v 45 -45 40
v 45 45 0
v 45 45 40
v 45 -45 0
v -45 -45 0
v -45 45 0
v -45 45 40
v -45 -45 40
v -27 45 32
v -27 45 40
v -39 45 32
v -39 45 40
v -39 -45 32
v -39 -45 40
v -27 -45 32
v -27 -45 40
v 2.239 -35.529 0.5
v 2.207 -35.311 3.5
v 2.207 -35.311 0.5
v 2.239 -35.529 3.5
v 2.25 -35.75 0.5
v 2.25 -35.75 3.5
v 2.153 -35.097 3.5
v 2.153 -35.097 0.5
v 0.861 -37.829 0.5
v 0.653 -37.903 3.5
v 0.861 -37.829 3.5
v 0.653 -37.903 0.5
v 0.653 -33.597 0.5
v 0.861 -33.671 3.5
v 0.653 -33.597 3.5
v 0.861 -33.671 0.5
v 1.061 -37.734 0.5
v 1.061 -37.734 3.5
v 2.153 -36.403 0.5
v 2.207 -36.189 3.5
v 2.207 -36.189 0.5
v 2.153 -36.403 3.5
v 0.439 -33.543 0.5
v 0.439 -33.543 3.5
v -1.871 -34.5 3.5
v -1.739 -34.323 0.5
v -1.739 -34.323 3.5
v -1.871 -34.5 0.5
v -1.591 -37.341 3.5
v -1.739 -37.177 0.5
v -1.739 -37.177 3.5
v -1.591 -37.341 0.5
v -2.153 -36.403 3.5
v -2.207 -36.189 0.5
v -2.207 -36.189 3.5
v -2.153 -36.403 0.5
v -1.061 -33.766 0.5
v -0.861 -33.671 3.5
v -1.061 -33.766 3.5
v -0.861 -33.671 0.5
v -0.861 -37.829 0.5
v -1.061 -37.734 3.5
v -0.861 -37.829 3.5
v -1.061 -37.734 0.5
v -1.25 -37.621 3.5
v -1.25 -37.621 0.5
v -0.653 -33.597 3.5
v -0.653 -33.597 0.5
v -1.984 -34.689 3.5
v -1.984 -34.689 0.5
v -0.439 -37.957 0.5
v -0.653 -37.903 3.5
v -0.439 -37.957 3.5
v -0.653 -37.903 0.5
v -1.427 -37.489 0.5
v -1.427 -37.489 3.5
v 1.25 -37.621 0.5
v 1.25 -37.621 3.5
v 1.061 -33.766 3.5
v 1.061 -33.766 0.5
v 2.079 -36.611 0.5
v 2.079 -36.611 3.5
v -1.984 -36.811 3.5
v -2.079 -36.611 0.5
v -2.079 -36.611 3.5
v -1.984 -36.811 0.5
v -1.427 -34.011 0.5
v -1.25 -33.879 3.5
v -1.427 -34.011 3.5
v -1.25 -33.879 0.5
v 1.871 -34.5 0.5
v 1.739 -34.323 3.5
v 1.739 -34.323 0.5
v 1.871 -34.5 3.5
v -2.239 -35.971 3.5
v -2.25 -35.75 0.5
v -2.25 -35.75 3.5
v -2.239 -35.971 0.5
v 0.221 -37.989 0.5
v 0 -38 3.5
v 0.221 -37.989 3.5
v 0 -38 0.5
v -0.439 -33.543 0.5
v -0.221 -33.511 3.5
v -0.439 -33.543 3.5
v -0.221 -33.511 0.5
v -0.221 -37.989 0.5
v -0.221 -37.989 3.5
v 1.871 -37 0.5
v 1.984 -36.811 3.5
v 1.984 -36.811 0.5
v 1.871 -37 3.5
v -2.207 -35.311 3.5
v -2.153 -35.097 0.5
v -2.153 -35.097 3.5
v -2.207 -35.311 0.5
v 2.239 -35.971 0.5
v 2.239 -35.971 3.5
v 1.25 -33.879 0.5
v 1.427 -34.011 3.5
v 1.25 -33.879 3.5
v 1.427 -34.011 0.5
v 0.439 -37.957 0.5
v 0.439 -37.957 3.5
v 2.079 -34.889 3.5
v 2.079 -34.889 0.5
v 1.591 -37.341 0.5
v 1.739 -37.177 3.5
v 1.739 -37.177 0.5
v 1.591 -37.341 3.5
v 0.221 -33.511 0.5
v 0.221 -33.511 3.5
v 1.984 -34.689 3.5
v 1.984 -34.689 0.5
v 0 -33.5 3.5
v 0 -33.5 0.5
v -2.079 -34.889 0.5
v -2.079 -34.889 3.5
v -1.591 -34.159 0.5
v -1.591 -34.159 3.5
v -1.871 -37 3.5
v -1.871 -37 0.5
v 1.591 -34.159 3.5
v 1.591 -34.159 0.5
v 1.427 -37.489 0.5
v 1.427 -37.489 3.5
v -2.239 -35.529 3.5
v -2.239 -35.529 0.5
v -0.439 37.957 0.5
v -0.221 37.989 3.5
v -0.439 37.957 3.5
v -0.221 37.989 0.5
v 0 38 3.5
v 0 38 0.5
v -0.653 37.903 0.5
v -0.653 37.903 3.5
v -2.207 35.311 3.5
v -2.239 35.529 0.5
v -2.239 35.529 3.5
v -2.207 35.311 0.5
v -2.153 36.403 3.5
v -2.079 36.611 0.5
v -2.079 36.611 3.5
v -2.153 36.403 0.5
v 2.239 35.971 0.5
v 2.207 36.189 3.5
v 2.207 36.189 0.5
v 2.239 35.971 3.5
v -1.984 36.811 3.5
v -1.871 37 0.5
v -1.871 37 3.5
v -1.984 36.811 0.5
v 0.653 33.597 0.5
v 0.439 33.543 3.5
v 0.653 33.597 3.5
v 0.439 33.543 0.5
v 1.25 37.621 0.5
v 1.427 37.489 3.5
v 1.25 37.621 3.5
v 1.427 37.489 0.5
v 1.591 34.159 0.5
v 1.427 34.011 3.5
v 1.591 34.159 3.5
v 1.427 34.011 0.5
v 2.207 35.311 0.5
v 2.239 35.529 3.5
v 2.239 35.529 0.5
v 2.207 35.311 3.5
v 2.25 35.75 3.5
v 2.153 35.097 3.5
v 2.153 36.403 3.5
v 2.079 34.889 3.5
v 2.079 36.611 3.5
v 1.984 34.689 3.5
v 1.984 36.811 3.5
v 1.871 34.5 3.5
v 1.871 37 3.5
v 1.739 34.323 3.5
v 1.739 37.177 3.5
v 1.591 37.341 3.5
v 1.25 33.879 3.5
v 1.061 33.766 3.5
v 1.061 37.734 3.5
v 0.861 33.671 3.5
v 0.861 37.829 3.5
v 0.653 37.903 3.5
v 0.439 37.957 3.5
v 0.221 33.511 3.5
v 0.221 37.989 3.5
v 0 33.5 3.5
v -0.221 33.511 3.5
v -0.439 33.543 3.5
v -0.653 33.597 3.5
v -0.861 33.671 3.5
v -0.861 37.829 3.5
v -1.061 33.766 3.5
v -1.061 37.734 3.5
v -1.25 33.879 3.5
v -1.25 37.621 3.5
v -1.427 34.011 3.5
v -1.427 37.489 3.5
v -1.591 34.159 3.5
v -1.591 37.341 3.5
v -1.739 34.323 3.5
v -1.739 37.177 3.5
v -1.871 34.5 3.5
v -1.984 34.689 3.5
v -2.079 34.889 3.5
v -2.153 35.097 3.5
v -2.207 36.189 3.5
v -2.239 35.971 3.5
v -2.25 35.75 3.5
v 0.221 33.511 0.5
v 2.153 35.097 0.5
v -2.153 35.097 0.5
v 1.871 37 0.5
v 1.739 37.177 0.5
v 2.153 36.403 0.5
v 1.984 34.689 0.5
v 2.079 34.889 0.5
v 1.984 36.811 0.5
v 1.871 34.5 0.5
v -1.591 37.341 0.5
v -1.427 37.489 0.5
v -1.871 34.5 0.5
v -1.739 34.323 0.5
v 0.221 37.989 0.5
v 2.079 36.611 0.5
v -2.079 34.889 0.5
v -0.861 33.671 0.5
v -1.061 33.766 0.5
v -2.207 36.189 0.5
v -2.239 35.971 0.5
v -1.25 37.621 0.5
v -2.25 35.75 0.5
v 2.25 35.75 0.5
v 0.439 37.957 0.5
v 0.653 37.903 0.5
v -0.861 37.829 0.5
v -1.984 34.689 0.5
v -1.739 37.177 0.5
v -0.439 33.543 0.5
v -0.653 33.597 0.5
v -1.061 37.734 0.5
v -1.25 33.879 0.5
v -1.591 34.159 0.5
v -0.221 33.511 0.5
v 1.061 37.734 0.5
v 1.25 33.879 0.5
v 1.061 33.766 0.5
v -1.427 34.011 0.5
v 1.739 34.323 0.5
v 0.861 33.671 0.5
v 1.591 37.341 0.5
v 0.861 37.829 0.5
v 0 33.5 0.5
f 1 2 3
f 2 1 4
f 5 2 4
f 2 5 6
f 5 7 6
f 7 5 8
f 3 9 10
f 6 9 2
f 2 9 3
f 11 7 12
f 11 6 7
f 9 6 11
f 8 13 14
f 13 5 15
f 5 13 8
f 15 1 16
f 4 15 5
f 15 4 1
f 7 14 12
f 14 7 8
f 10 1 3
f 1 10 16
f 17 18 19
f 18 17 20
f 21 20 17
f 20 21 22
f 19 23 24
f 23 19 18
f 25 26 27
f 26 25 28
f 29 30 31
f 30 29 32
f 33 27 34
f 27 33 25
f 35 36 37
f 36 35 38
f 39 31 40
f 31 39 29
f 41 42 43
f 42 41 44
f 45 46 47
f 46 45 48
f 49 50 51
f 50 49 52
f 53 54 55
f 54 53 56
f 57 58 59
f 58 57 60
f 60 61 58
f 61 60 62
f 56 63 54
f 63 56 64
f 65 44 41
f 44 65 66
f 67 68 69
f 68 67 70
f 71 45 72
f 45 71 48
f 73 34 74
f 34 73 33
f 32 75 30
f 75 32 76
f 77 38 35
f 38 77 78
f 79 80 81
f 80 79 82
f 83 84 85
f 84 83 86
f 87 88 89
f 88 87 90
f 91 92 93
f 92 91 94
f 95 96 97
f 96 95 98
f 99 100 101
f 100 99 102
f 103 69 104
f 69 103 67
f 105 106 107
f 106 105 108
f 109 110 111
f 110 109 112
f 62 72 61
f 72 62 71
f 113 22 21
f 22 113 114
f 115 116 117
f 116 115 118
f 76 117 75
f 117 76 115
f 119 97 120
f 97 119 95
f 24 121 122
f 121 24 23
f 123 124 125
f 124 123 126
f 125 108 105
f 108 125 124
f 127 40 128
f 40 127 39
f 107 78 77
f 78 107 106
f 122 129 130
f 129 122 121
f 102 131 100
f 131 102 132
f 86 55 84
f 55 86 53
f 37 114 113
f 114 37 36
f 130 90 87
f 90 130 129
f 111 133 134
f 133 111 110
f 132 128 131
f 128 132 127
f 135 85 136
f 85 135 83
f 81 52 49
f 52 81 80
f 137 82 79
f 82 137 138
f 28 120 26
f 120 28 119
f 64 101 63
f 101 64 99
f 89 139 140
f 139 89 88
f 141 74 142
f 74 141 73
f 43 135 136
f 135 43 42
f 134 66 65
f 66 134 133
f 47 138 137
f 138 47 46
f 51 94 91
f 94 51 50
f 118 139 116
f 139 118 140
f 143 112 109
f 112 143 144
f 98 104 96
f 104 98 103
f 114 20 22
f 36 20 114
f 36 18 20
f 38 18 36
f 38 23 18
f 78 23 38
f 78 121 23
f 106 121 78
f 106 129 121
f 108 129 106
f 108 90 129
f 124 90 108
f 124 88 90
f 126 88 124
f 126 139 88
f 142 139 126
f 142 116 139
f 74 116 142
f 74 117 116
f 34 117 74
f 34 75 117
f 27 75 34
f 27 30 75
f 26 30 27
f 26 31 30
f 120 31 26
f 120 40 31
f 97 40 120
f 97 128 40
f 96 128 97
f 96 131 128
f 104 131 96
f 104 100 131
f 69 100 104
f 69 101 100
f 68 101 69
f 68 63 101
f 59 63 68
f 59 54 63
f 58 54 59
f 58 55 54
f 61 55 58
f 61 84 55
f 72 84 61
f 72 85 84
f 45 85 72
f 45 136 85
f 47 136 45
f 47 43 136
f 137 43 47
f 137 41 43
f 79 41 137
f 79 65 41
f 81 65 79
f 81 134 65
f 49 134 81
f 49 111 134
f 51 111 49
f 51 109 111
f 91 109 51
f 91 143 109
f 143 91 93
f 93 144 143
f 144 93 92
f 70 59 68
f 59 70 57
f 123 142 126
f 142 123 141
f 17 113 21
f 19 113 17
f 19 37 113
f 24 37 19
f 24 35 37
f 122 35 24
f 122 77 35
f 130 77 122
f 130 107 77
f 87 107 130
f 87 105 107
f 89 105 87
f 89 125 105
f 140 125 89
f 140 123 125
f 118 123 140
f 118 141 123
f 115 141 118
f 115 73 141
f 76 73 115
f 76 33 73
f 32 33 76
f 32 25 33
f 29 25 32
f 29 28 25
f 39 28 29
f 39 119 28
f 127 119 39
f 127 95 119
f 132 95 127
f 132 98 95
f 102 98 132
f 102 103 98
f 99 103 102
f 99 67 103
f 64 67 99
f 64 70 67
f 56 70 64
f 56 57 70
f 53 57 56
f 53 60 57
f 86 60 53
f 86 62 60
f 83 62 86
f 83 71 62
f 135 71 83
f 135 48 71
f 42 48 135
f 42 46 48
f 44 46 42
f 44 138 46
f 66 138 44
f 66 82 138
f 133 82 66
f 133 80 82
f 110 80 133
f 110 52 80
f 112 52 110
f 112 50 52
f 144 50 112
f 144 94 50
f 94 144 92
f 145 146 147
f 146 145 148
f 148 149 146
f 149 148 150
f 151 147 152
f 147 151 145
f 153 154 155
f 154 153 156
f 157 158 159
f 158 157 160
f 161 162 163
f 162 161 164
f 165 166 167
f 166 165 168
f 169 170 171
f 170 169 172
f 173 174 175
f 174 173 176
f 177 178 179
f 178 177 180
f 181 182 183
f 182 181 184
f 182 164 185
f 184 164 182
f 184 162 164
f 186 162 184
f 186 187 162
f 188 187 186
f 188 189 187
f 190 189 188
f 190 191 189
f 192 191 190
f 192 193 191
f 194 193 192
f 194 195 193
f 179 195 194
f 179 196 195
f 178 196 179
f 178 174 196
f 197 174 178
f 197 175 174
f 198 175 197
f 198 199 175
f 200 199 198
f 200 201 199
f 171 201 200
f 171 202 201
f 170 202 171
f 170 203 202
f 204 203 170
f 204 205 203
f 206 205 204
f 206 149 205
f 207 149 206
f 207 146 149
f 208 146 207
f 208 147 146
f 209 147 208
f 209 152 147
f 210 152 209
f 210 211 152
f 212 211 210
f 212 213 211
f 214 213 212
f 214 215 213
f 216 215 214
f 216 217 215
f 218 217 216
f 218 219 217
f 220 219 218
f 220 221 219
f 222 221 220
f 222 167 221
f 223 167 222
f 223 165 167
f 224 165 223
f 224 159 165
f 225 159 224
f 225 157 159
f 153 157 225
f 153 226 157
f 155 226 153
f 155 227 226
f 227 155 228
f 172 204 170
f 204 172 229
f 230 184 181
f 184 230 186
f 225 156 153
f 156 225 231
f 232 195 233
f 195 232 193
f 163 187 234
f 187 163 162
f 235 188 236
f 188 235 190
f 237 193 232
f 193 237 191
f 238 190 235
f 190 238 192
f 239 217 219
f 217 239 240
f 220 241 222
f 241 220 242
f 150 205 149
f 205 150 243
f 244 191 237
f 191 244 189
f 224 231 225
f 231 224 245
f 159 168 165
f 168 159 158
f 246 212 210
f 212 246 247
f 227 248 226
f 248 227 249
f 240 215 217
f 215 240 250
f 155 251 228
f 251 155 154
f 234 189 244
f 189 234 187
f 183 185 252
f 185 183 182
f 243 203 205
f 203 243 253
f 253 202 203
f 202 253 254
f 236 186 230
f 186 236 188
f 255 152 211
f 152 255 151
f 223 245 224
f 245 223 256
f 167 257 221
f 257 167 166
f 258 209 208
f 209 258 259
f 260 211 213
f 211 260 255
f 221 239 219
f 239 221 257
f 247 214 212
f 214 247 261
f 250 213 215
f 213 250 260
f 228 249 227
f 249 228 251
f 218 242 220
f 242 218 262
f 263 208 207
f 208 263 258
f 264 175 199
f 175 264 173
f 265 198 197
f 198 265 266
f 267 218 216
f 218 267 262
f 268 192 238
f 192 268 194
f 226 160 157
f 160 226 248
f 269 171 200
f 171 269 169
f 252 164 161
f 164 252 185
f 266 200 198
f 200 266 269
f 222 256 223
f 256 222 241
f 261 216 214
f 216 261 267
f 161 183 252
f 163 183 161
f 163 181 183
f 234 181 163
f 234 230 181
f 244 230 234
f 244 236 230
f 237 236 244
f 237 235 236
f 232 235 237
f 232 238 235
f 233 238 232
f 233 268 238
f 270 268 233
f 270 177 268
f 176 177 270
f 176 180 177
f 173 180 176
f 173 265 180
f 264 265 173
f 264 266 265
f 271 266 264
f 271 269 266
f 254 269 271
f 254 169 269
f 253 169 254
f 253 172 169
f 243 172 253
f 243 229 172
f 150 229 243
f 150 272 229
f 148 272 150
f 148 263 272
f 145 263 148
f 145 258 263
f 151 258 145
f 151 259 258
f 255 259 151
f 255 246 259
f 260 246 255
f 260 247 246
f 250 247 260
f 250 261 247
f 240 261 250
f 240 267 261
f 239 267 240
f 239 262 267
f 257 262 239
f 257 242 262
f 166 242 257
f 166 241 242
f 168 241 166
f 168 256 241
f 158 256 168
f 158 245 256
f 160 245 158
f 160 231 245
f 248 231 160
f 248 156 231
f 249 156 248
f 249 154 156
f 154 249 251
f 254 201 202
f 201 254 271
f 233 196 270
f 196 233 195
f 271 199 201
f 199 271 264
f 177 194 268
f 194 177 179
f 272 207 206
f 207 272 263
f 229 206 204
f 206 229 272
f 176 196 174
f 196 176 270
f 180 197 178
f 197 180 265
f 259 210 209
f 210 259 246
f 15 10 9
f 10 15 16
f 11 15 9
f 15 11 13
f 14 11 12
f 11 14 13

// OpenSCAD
// Magnetic stirrer housing - upside-down open box over PC fan
// Print orientation: top plate on bed (z = 0), walls rise to z = 40

$fn = 64;

// ---- Dimensions (mm) ----
plate_t      = 2;     // top plate thickness
wall_t       = 2.5;   // wall thickness
box_h        = 40;    // total height (open top at z = 40)
outer_x      = 90;    // outer size in X
outer_y      = 90;    // outer size in Y
hole_d       = 4.5;   // M4 screw hole diameter
hole_n       = 4;     // number of screw holes
hole_pitch   = 71.5;  // square hole pattern side length
notch_w      = 12;    // cable notch width
notch_d      = 8;     // notch depth from open edge
eps          = 0.5;   // cutter overshoot past faces

// ---- Model ----
difference() {
    // Closed top plate, open box below
    union() {
        translate([-outer_x/2, -outer_y/2, 0])
            cube([outer_x, outer_y, plate_t]);
        translate([-outer_x/2, -outer_y/2, plate_t])
            cube([outer_x, outer_y, box_h - plate_t]);
    }

    // Screw holes through top plate, centred on plate
    for (i = [0 : hole_n - 1]) {
        a = (i < 2) ? 0 : 90;   // two rows along Y
        translate([hole_pitch/2 - hole_pitch/2, a ? hole_pitch/2 : -hole_pitch/2, plate_t/2 - eps])
            rotate([0, 0, a])
                cylinder(d = hole_d, h = plate_t + 2*eps);
    }

    // Cable notch in one wall, centred along the wall
    translate([-outer_x/2 + notch_w/2, -outer_y/2, box_h - notch_d])
        cube([notch_w, outer_y, notch_d + eps]);
}
